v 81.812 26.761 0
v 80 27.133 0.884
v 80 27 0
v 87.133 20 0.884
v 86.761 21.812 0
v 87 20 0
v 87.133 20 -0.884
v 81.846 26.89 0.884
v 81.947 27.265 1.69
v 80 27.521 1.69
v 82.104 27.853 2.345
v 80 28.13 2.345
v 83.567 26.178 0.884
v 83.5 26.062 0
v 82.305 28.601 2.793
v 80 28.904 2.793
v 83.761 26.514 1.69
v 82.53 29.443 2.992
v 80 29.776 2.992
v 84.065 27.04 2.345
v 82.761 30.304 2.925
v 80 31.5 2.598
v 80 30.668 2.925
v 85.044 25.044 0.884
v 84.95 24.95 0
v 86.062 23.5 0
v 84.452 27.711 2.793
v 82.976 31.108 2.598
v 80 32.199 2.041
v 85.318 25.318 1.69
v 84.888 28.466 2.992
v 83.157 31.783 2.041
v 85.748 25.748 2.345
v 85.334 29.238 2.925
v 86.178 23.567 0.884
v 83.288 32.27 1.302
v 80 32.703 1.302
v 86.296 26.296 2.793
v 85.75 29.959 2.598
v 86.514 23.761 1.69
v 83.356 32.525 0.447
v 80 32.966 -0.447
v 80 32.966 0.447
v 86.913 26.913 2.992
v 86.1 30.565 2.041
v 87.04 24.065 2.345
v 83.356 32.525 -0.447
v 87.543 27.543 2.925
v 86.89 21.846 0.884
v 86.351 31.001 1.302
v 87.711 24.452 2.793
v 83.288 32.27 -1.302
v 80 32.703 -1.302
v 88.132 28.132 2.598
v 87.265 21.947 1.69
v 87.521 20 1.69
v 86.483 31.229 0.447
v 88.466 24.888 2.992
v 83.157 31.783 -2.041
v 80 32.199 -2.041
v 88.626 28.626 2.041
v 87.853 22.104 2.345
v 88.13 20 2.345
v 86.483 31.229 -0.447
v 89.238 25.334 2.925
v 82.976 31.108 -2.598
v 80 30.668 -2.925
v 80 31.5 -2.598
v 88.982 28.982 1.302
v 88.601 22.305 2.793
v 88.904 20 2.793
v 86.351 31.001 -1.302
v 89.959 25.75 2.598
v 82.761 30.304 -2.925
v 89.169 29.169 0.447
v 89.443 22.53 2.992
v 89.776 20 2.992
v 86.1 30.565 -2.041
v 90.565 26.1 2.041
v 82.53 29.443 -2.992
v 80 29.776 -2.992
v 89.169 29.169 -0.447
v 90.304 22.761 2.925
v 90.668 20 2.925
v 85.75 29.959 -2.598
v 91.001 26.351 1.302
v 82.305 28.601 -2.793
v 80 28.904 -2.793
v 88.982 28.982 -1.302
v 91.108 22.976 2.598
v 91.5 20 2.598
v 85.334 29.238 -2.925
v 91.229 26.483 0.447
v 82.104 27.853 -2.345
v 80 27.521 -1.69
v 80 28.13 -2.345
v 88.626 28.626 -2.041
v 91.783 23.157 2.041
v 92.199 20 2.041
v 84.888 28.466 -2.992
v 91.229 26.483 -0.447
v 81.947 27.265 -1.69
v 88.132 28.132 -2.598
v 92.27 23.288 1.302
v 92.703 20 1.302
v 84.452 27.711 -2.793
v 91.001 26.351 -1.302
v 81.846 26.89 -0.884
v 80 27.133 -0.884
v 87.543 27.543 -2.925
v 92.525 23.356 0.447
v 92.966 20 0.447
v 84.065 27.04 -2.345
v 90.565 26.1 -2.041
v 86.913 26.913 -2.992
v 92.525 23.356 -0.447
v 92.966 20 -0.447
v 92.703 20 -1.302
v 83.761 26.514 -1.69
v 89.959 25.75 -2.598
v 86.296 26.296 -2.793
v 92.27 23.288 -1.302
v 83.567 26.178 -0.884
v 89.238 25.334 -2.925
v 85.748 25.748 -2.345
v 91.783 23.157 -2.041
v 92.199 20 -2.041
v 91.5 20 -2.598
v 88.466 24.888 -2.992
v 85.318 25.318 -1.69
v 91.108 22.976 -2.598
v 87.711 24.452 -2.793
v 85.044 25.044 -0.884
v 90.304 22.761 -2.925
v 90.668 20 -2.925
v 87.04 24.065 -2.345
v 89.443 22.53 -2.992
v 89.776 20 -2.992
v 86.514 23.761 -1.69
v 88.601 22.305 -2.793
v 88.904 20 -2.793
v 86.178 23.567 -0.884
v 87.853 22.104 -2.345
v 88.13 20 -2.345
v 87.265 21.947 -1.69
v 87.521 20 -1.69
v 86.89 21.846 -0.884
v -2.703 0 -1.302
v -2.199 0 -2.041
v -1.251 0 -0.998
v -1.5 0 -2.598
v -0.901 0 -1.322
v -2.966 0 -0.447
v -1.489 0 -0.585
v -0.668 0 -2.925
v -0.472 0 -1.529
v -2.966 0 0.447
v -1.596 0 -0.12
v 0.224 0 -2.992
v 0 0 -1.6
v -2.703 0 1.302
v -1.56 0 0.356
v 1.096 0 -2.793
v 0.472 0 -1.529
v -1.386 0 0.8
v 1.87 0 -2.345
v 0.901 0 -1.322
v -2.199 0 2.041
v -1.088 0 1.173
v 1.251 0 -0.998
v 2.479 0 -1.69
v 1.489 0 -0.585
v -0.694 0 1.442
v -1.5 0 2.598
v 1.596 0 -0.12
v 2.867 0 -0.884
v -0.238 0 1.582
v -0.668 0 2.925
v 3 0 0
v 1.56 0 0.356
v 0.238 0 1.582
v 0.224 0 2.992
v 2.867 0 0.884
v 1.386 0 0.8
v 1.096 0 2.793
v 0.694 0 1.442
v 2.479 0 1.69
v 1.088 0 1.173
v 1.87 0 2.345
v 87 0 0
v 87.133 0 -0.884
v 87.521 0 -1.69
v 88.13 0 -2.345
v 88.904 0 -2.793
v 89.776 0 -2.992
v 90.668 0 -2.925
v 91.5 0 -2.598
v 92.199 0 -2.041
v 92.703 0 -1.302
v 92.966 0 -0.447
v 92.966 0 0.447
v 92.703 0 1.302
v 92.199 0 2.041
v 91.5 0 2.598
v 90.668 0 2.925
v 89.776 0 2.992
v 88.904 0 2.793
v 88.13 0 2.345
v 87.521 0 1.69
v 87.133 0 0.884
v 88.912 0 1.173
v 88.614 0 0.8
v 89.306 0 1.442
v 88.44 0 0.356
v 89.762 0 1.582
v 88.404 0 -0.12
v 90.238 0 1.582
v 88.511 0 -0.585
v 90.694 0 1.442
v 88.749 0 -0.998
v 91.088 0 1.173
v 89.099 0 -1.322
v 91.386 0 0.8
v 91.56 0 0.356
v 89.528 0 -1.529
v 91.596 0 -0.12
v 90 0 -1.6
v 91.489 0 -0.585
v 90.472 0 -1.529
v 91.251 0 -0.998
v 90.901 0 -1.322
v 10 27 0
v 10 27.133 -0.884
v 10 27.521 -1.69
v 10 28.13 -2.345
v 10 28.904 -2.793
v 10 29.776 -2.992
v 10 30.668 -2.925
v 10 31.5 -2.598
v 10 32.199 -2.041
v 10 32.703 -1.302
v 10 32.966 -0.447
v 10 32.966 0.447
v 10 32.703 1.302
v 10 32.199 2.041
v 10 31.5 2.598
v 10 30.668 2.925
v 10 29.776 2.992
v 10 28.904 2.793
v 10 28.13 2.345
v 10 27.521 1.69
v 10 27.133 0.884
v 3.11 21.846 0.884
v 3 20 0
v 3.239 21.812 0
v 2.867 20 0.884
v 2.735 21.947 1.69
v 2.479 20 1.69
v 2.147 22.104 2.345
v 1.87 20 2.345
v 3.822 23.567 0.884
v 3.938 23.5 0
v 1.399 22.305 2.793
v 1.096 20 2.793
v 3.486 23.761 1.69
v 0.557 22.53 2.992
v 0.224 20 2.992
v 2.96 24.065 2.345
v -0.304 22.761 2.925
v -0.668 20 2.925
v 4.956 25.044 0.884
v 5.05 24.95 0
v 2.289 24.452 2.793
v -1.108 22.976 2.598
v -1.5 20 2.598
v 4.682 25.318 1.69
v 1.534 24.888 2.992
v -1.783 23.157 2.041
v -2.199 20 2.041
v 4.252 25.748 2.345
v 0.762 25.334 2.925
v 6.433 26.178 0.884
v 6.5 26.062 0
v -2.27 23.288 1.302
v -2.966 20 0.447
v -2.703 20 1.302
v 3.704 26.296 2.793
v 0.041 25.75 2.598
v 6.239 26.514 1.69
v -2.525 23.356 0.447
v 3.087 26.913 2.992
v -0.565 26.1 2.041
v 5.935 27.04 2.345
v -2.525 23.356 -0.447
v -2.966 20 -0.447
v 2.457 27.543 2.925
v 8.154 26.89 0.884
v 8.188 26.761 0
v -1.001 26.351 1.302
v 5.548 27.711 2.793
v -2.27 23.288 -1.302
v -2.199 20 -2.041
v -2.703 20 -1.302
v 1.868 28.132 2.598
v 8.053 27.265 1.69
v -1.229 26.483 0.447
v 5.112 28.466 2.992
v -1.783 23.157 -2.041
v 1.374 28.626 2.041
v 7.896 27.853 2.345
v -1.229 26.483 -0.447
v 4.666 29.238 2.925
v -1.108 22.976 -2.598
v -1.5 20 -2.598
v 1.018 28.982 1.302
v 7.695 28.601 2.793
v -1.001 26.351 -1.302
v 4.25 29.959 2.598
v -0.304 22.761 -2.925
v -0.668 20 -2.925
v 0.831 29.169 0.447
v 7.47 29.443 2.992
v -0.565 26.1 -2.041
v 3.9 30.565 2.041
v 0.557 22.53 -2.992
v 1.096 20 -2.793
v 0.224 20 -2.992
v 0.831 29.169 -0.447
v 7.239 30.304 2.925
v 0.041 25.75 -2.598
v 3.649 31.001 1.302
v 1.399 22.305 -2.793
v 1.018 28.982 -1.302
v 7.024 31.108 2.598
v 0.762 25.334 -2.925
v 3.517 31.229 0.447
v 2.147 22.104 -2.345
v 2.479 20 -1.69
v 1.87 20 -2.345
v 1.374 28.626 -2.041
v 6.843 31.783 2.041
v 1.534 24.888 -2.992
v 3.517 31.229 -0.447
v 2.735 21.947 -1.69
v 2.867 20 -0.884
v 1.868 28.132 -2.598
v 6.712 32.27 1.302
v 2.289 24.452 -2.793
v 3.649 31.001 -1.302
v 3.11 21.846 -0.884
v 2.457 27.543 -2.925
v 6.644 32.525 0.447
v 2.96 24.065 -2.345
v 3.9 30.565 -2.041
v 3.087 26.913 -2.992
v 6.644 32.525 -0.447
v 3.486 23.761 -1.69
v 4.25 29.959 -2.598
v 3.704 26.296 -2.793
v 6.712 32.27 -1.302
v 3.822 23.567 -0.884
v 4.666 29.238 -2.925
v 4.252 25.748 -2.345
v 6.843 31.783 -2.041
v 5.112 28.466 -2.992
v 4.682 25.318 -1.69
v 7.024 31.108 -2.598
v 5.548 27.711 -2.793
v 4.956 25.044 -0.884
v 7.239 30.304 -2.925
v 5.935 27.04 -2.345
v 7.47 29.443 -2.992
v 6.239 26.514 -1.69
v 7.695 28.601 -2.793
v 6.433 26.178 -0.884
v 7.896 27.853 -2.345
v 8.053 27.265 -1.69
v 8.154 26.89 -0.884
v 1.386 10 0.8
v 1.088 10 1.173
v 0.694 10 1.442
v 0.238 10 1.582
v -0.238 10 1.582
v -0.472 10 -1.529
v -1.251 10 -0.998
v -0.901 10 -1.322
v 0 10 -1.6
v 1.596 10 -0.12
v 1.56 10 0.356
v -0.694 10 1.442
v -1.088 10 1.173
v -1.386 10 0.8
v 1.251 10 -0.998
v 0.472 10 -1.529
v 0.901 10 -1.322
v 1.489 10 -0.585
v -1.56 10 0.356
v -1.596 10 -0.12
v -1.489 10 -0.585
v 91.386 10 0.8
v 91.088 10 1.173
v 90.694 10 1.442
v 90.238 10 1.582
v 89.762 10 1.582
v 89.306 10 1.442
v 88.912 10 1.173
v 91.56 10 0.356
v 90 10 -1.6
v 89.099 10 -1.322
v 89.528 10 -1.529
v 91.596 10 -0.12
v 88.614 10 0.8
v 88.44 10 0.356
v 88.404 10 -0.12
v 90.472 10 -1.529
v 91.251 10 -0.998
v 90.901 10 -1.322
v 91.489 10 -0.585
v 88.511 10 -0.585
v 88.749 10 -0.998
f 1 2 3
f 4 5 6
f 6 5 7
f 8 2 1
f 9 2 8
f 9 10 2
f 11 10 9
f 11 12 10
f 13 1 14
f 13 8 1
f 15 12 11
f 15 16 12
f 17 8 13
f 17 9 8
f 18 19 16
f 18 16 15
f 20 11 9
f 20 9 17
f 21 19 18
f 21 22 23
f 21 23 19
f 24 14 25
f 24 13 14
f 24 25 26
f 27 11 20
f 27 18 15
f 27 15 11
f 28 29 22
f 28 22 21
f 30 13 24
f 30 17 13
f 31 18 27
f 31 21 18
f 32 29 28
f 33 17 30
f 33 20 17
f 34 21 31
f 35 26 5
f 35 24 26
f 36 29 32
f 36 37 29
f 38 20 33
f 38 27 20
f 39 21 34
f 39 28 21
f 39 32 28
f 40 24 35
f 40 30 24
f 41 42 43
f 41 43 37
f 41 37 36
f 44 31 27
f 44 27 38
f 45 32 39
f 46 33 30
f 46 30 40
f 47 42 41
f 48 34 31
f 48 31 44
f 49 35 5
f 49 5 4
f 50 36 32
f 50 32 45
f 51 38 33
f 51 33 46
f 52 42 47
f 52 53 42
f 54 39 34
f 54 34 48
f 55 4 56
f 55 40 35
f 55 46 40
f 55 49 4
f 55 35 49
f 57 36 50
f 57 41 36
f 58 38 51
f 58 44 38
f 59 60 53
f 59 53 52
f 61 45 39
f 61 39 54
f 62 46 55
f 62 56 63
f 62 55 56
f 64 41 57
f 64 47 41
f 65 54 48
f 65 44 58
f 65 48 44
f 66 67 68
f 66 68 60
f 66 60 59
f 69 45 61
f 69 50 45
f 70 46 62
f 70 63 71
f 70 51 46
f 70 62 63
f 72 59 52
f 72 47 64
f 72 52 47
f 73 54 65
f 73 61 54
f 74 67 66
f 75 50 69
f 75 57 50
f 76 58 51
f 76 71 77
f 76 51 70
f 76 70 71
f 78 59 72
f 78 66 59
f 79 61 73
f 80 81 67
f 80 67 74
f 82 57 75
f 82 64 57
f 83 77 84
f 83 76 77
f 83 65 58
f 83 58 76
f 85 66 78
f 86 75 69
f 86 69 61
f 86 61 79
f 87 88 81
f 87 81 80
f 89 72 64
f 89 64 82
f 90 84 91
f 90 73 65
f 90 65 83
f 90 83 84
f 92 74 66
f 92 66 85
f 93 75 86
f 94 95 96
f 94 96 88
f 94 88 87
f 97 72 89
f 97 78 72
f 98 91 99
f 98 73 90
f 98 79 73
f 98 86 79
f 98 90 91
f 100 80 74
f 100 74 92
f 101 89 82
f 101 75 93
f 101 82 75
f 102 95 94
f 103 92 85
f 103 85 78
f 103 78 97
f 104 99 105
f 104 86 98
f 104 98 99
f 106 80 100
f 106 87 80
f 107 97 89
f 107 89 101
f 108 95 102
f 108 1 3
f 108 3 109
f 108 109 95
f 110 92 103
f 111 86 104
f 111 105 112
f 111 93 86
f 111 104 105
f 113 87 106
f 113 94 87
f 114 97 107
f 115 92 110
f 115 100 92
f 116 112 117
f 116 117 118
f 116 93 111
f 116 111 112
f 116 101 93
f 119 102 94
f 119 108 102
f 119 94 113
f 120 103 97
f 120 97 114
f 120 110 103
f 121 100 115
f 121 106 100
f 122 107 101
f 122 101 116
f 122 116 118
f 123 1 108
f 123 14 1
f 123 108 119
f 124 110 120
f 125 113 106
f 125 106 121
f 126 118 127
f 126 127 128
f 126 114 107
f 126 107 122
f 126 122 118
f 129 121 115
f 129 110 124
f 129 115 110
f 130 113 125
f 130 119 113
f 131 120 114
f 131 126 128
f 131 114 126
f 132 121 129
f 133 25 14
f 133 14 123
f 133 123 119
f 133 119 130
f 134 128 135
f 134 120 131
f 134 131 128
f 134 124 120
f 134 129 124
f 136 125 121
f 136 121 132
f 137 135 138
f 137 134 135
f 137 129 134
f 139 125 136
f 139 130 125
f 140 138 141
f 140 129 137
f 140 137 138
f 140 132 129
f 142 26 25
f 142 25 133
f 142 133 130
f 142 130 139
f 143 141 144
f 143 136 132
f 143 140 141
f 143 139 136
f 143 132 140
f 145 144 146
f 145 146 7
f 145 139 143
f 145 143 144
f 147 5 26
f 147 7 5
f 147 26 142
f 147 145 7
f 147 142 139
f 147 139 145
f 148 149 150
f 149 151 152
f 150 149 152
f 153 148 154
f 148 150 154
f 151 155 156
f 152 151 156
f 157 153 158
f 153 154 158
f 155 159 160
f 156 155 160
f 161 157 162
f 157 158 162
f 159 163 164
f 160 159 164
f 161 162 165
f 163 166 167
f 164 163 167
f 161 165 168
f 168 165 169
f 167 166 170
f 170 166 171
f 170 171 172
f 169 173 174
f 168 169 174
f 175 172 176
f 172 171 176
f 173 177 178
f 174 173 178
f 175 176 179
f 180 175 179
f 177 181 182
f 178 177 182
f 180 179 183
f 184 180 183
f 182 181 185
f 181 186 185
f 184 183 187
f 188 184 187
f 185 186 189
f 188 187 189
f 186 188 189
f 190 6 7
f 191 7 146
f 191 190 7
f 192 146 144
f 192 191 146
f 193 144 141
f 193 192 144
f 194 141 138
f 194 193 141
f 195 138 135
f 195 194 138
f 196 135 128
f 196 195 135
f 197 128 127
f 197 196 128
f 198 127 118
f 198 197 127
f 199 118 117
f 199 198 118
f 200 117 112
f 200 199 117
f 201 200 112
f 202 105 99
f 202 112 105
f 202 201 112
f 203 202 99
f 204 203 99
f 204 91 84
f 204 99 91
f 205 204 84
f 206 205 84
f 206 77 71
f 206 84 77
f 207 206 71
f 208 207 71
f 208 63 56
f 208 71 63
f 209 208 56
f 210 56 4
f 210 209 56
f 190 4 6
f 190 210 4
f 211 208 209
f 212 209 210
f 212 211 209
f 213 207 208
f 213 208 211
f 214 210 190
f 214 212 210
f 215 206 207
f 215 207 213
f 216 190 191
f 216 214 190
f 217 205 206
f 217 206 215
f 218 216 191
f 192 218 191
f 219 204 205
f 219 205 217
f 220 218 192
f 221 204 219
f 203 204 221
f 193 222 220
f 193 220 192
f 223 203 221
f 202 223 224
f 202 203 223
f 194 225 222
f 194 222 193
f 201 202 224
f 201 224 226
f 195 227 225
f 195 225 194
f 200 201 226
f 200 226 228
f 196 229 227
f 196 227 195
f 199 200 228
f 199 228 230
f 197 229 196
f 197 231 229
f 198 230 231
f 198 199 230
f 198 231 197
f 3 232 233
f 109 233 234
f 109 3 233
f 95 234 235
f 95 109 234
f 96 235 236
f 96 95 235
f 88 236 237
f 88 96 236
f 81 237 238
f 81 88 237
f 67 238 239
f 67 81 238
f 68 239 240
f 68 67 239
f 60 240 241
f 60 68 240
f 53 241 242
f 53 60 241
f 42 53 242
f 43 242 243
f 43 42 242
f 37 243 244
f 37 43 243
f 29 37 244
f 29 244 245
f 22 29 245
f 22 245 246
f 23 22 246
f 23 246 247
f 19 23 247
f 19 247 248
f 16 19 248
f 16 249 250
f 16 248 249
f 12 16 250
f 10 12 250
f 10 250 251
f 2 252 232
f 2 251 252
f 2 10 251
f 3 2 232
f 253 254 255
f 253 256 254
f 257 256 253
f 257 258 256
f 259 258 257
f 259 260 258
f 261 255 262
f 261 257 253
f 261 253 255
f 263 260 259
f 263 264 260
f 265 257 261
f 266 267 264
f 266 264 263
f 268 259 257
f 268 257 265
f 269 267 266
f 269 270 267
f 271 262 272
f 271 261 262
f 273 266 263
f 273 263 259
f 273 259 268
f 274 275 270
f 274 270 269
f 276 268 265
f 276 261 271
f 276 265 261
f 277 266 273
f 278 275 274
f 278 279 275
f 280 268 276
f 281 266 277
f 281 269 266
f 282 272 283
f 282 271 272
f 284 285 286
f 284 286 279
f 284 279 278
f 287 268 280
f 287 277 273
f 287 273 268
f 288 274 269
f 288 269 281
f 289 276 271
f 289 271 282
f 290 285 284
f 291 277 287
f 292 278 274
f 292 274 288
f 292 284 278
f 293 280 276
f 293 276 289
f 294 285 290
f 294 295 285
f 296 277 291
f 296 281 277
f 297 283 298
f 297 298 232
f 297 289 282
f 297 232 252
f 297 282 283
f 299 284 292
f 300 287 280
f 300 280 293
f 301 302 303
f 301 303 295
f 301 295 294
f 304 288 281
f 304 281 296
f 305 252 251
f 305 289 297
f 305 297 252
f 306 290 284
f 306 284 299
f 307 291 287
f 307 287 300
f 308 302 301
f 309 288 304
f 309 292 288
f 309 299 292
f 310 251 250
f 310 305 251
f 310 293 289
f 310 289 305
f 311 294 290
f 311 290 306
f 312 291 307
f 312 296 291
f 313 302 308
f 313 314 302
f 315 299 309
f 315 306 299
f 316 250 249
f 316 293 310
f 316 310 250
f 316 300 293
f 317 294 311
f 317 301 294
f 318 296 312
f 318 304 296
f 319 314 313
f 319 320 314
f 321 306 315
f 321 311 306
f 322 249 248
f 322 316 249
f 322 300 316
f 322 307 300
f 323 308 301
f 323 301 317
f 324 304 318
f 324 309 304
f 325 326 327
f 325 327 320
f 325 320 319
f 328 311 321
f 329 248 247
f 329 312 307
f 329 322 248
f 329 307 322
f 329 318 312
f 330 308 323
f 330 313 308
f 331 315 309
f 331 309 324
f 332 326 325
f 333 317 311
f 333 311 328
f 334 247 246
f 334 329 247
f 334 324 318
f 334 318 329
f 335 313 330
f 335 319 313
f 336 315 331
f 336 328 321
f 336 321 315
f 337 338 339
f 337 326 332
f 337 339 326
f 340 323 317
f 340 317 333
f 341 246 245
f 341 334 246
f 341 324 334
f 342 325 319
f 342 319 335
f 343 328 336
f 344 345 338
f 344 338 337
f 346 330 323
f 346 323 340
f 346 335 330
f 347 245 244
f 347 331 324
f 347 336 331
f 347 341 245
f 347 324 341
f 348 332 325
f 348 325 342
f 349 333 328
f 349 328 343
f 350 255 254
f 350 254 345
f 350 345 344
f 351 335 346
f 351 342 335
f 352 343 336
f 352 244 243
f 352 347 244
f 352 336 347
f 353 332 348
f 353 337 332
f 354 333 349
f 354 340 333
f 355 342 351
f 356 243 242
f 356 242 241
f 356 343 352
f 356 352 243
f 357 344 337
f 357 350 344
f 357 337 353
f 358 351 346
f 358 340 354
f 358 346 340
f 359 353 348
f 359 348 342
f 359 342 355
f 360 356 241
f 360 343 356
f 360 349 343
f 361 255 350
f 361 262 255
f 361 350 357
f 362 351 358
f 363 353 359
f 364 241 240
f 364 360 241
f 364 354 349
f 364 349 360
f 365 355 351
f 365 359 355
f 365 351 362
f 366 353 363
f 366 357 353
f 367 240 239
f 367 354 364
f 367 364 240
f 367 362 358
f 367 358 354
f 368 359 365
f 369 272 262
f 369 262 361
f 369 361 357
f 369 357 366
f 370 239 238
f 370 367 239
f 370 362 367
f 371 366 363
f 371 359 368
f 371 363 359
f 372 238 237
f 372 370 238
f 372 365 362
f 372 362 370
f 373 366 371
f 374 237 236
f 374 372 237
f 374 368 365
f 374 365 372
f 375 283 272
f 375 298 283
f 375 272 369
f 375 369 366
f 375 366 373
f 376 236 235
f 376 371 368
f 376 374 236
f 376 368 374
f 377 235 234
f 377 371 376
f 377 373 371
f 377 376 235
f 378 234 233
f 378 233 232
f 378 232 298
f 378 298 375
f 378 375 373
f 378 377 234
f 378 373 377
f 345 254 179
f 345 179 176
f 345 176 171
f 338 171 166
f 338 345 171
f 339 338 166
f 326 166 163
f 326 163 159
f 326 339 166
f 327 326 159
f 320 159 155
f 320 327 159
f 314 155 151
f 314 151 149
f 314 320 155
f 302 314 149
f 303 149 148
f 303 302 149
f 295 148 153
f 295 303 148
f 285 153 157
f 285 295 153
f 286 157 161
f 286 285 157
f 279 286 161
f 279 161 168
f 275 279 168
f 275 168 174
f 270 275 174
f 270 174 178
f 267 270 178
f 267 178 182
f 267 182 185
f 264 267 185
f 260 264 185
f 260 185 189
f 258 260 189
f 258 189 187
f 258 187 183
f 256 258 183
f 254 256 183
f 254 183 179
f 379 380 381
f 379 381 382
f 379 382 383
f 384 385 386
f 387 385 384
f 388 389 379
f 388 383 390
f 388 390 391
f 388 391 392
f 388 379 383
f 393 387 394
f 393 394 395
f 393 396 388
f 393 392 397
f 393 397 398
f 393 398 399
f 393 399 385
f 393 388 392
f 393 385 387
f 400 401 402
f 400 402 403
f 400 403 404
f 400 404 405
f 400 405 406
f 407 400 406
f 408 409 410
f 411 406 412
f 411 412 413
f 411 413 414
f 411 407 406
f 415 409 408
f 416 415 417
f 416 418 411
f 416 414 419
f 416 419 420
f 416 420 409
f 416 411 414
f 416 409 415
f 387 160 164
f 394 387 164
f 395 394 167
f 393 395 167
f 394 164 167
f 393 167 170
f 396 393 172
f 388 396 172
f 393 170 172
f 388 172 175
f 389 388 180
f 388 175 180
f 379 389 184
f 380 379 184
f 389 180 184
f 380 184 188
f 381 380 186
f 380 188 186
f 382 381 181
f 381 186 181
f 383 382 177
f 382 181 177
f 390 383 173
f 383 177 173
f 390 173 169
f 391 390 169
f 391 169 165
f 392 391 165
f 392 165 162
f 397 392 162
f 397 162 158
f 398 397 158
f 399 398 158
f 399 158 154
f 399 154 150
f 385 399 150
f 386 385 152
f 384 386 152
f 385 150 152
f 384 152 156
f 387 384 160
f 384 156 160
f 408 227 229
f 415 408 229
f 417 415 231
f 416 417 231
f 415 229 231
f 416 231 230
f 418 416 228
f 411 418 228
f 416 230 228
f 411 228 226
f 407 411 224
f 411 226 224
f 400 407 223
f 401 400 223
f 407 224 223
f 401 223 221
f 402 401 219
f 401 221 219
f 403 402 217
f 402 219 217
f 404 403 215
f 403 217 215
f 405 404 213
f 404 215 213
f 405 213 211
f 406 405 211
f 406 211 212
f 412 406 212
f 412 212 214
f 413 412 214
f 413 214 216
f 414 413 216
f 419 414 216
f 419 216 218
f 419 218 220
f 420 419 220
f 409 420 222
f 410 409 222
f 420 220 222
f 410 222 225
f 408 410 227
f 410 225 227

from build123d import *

# Parameters (mm, degrees)
SKETCH_2_R          = 3
SKETCH_3_R          = 1.6
CUT_EXTRUDE_1_DEPTH = 10


with BuildPart() as part:
    # 扫描1: sweep along a path in 草图1
    with BuildLine(Plane.XY) as sweep_1_path:
        Line((0, 0), (0, 20))
        ThreePointArc((0, 20), (2.928932188, 27.071067812), (10, 30))
        Line((10, 30), (80, 30))
        ThreePointArc((80, 30), (87.071067812, 27.071067812), (90, 20))
        Line((90, 20), (90, 0))
    # 草图2 → 扫描1 (sweep)
    with BuildSketch(Plane(origin=(0, 0, 0), x_dir=(1, 0, 0), z_dir=(0, 1, 0))):
        Circle(SKETCH_2_R)
    sweep(path=sweep_1_path.line)

    # 草图3 → 切除-拉伸1 (cut)
    with BuildSketch(Plane.XZ):
        with Locations(Location((0, 0, 0), (0, 0, 270))):
            Circle(SKETCH_3_R)
        with Locations(Location((90, 0, 0), (0, 0, 270))):
            Circle(SKETCH_3_R)
    extrude(amount=-CUT_EXTRUDE_1_DEPTH, mode=Mode.SUBTRACT)


solid = part.part
